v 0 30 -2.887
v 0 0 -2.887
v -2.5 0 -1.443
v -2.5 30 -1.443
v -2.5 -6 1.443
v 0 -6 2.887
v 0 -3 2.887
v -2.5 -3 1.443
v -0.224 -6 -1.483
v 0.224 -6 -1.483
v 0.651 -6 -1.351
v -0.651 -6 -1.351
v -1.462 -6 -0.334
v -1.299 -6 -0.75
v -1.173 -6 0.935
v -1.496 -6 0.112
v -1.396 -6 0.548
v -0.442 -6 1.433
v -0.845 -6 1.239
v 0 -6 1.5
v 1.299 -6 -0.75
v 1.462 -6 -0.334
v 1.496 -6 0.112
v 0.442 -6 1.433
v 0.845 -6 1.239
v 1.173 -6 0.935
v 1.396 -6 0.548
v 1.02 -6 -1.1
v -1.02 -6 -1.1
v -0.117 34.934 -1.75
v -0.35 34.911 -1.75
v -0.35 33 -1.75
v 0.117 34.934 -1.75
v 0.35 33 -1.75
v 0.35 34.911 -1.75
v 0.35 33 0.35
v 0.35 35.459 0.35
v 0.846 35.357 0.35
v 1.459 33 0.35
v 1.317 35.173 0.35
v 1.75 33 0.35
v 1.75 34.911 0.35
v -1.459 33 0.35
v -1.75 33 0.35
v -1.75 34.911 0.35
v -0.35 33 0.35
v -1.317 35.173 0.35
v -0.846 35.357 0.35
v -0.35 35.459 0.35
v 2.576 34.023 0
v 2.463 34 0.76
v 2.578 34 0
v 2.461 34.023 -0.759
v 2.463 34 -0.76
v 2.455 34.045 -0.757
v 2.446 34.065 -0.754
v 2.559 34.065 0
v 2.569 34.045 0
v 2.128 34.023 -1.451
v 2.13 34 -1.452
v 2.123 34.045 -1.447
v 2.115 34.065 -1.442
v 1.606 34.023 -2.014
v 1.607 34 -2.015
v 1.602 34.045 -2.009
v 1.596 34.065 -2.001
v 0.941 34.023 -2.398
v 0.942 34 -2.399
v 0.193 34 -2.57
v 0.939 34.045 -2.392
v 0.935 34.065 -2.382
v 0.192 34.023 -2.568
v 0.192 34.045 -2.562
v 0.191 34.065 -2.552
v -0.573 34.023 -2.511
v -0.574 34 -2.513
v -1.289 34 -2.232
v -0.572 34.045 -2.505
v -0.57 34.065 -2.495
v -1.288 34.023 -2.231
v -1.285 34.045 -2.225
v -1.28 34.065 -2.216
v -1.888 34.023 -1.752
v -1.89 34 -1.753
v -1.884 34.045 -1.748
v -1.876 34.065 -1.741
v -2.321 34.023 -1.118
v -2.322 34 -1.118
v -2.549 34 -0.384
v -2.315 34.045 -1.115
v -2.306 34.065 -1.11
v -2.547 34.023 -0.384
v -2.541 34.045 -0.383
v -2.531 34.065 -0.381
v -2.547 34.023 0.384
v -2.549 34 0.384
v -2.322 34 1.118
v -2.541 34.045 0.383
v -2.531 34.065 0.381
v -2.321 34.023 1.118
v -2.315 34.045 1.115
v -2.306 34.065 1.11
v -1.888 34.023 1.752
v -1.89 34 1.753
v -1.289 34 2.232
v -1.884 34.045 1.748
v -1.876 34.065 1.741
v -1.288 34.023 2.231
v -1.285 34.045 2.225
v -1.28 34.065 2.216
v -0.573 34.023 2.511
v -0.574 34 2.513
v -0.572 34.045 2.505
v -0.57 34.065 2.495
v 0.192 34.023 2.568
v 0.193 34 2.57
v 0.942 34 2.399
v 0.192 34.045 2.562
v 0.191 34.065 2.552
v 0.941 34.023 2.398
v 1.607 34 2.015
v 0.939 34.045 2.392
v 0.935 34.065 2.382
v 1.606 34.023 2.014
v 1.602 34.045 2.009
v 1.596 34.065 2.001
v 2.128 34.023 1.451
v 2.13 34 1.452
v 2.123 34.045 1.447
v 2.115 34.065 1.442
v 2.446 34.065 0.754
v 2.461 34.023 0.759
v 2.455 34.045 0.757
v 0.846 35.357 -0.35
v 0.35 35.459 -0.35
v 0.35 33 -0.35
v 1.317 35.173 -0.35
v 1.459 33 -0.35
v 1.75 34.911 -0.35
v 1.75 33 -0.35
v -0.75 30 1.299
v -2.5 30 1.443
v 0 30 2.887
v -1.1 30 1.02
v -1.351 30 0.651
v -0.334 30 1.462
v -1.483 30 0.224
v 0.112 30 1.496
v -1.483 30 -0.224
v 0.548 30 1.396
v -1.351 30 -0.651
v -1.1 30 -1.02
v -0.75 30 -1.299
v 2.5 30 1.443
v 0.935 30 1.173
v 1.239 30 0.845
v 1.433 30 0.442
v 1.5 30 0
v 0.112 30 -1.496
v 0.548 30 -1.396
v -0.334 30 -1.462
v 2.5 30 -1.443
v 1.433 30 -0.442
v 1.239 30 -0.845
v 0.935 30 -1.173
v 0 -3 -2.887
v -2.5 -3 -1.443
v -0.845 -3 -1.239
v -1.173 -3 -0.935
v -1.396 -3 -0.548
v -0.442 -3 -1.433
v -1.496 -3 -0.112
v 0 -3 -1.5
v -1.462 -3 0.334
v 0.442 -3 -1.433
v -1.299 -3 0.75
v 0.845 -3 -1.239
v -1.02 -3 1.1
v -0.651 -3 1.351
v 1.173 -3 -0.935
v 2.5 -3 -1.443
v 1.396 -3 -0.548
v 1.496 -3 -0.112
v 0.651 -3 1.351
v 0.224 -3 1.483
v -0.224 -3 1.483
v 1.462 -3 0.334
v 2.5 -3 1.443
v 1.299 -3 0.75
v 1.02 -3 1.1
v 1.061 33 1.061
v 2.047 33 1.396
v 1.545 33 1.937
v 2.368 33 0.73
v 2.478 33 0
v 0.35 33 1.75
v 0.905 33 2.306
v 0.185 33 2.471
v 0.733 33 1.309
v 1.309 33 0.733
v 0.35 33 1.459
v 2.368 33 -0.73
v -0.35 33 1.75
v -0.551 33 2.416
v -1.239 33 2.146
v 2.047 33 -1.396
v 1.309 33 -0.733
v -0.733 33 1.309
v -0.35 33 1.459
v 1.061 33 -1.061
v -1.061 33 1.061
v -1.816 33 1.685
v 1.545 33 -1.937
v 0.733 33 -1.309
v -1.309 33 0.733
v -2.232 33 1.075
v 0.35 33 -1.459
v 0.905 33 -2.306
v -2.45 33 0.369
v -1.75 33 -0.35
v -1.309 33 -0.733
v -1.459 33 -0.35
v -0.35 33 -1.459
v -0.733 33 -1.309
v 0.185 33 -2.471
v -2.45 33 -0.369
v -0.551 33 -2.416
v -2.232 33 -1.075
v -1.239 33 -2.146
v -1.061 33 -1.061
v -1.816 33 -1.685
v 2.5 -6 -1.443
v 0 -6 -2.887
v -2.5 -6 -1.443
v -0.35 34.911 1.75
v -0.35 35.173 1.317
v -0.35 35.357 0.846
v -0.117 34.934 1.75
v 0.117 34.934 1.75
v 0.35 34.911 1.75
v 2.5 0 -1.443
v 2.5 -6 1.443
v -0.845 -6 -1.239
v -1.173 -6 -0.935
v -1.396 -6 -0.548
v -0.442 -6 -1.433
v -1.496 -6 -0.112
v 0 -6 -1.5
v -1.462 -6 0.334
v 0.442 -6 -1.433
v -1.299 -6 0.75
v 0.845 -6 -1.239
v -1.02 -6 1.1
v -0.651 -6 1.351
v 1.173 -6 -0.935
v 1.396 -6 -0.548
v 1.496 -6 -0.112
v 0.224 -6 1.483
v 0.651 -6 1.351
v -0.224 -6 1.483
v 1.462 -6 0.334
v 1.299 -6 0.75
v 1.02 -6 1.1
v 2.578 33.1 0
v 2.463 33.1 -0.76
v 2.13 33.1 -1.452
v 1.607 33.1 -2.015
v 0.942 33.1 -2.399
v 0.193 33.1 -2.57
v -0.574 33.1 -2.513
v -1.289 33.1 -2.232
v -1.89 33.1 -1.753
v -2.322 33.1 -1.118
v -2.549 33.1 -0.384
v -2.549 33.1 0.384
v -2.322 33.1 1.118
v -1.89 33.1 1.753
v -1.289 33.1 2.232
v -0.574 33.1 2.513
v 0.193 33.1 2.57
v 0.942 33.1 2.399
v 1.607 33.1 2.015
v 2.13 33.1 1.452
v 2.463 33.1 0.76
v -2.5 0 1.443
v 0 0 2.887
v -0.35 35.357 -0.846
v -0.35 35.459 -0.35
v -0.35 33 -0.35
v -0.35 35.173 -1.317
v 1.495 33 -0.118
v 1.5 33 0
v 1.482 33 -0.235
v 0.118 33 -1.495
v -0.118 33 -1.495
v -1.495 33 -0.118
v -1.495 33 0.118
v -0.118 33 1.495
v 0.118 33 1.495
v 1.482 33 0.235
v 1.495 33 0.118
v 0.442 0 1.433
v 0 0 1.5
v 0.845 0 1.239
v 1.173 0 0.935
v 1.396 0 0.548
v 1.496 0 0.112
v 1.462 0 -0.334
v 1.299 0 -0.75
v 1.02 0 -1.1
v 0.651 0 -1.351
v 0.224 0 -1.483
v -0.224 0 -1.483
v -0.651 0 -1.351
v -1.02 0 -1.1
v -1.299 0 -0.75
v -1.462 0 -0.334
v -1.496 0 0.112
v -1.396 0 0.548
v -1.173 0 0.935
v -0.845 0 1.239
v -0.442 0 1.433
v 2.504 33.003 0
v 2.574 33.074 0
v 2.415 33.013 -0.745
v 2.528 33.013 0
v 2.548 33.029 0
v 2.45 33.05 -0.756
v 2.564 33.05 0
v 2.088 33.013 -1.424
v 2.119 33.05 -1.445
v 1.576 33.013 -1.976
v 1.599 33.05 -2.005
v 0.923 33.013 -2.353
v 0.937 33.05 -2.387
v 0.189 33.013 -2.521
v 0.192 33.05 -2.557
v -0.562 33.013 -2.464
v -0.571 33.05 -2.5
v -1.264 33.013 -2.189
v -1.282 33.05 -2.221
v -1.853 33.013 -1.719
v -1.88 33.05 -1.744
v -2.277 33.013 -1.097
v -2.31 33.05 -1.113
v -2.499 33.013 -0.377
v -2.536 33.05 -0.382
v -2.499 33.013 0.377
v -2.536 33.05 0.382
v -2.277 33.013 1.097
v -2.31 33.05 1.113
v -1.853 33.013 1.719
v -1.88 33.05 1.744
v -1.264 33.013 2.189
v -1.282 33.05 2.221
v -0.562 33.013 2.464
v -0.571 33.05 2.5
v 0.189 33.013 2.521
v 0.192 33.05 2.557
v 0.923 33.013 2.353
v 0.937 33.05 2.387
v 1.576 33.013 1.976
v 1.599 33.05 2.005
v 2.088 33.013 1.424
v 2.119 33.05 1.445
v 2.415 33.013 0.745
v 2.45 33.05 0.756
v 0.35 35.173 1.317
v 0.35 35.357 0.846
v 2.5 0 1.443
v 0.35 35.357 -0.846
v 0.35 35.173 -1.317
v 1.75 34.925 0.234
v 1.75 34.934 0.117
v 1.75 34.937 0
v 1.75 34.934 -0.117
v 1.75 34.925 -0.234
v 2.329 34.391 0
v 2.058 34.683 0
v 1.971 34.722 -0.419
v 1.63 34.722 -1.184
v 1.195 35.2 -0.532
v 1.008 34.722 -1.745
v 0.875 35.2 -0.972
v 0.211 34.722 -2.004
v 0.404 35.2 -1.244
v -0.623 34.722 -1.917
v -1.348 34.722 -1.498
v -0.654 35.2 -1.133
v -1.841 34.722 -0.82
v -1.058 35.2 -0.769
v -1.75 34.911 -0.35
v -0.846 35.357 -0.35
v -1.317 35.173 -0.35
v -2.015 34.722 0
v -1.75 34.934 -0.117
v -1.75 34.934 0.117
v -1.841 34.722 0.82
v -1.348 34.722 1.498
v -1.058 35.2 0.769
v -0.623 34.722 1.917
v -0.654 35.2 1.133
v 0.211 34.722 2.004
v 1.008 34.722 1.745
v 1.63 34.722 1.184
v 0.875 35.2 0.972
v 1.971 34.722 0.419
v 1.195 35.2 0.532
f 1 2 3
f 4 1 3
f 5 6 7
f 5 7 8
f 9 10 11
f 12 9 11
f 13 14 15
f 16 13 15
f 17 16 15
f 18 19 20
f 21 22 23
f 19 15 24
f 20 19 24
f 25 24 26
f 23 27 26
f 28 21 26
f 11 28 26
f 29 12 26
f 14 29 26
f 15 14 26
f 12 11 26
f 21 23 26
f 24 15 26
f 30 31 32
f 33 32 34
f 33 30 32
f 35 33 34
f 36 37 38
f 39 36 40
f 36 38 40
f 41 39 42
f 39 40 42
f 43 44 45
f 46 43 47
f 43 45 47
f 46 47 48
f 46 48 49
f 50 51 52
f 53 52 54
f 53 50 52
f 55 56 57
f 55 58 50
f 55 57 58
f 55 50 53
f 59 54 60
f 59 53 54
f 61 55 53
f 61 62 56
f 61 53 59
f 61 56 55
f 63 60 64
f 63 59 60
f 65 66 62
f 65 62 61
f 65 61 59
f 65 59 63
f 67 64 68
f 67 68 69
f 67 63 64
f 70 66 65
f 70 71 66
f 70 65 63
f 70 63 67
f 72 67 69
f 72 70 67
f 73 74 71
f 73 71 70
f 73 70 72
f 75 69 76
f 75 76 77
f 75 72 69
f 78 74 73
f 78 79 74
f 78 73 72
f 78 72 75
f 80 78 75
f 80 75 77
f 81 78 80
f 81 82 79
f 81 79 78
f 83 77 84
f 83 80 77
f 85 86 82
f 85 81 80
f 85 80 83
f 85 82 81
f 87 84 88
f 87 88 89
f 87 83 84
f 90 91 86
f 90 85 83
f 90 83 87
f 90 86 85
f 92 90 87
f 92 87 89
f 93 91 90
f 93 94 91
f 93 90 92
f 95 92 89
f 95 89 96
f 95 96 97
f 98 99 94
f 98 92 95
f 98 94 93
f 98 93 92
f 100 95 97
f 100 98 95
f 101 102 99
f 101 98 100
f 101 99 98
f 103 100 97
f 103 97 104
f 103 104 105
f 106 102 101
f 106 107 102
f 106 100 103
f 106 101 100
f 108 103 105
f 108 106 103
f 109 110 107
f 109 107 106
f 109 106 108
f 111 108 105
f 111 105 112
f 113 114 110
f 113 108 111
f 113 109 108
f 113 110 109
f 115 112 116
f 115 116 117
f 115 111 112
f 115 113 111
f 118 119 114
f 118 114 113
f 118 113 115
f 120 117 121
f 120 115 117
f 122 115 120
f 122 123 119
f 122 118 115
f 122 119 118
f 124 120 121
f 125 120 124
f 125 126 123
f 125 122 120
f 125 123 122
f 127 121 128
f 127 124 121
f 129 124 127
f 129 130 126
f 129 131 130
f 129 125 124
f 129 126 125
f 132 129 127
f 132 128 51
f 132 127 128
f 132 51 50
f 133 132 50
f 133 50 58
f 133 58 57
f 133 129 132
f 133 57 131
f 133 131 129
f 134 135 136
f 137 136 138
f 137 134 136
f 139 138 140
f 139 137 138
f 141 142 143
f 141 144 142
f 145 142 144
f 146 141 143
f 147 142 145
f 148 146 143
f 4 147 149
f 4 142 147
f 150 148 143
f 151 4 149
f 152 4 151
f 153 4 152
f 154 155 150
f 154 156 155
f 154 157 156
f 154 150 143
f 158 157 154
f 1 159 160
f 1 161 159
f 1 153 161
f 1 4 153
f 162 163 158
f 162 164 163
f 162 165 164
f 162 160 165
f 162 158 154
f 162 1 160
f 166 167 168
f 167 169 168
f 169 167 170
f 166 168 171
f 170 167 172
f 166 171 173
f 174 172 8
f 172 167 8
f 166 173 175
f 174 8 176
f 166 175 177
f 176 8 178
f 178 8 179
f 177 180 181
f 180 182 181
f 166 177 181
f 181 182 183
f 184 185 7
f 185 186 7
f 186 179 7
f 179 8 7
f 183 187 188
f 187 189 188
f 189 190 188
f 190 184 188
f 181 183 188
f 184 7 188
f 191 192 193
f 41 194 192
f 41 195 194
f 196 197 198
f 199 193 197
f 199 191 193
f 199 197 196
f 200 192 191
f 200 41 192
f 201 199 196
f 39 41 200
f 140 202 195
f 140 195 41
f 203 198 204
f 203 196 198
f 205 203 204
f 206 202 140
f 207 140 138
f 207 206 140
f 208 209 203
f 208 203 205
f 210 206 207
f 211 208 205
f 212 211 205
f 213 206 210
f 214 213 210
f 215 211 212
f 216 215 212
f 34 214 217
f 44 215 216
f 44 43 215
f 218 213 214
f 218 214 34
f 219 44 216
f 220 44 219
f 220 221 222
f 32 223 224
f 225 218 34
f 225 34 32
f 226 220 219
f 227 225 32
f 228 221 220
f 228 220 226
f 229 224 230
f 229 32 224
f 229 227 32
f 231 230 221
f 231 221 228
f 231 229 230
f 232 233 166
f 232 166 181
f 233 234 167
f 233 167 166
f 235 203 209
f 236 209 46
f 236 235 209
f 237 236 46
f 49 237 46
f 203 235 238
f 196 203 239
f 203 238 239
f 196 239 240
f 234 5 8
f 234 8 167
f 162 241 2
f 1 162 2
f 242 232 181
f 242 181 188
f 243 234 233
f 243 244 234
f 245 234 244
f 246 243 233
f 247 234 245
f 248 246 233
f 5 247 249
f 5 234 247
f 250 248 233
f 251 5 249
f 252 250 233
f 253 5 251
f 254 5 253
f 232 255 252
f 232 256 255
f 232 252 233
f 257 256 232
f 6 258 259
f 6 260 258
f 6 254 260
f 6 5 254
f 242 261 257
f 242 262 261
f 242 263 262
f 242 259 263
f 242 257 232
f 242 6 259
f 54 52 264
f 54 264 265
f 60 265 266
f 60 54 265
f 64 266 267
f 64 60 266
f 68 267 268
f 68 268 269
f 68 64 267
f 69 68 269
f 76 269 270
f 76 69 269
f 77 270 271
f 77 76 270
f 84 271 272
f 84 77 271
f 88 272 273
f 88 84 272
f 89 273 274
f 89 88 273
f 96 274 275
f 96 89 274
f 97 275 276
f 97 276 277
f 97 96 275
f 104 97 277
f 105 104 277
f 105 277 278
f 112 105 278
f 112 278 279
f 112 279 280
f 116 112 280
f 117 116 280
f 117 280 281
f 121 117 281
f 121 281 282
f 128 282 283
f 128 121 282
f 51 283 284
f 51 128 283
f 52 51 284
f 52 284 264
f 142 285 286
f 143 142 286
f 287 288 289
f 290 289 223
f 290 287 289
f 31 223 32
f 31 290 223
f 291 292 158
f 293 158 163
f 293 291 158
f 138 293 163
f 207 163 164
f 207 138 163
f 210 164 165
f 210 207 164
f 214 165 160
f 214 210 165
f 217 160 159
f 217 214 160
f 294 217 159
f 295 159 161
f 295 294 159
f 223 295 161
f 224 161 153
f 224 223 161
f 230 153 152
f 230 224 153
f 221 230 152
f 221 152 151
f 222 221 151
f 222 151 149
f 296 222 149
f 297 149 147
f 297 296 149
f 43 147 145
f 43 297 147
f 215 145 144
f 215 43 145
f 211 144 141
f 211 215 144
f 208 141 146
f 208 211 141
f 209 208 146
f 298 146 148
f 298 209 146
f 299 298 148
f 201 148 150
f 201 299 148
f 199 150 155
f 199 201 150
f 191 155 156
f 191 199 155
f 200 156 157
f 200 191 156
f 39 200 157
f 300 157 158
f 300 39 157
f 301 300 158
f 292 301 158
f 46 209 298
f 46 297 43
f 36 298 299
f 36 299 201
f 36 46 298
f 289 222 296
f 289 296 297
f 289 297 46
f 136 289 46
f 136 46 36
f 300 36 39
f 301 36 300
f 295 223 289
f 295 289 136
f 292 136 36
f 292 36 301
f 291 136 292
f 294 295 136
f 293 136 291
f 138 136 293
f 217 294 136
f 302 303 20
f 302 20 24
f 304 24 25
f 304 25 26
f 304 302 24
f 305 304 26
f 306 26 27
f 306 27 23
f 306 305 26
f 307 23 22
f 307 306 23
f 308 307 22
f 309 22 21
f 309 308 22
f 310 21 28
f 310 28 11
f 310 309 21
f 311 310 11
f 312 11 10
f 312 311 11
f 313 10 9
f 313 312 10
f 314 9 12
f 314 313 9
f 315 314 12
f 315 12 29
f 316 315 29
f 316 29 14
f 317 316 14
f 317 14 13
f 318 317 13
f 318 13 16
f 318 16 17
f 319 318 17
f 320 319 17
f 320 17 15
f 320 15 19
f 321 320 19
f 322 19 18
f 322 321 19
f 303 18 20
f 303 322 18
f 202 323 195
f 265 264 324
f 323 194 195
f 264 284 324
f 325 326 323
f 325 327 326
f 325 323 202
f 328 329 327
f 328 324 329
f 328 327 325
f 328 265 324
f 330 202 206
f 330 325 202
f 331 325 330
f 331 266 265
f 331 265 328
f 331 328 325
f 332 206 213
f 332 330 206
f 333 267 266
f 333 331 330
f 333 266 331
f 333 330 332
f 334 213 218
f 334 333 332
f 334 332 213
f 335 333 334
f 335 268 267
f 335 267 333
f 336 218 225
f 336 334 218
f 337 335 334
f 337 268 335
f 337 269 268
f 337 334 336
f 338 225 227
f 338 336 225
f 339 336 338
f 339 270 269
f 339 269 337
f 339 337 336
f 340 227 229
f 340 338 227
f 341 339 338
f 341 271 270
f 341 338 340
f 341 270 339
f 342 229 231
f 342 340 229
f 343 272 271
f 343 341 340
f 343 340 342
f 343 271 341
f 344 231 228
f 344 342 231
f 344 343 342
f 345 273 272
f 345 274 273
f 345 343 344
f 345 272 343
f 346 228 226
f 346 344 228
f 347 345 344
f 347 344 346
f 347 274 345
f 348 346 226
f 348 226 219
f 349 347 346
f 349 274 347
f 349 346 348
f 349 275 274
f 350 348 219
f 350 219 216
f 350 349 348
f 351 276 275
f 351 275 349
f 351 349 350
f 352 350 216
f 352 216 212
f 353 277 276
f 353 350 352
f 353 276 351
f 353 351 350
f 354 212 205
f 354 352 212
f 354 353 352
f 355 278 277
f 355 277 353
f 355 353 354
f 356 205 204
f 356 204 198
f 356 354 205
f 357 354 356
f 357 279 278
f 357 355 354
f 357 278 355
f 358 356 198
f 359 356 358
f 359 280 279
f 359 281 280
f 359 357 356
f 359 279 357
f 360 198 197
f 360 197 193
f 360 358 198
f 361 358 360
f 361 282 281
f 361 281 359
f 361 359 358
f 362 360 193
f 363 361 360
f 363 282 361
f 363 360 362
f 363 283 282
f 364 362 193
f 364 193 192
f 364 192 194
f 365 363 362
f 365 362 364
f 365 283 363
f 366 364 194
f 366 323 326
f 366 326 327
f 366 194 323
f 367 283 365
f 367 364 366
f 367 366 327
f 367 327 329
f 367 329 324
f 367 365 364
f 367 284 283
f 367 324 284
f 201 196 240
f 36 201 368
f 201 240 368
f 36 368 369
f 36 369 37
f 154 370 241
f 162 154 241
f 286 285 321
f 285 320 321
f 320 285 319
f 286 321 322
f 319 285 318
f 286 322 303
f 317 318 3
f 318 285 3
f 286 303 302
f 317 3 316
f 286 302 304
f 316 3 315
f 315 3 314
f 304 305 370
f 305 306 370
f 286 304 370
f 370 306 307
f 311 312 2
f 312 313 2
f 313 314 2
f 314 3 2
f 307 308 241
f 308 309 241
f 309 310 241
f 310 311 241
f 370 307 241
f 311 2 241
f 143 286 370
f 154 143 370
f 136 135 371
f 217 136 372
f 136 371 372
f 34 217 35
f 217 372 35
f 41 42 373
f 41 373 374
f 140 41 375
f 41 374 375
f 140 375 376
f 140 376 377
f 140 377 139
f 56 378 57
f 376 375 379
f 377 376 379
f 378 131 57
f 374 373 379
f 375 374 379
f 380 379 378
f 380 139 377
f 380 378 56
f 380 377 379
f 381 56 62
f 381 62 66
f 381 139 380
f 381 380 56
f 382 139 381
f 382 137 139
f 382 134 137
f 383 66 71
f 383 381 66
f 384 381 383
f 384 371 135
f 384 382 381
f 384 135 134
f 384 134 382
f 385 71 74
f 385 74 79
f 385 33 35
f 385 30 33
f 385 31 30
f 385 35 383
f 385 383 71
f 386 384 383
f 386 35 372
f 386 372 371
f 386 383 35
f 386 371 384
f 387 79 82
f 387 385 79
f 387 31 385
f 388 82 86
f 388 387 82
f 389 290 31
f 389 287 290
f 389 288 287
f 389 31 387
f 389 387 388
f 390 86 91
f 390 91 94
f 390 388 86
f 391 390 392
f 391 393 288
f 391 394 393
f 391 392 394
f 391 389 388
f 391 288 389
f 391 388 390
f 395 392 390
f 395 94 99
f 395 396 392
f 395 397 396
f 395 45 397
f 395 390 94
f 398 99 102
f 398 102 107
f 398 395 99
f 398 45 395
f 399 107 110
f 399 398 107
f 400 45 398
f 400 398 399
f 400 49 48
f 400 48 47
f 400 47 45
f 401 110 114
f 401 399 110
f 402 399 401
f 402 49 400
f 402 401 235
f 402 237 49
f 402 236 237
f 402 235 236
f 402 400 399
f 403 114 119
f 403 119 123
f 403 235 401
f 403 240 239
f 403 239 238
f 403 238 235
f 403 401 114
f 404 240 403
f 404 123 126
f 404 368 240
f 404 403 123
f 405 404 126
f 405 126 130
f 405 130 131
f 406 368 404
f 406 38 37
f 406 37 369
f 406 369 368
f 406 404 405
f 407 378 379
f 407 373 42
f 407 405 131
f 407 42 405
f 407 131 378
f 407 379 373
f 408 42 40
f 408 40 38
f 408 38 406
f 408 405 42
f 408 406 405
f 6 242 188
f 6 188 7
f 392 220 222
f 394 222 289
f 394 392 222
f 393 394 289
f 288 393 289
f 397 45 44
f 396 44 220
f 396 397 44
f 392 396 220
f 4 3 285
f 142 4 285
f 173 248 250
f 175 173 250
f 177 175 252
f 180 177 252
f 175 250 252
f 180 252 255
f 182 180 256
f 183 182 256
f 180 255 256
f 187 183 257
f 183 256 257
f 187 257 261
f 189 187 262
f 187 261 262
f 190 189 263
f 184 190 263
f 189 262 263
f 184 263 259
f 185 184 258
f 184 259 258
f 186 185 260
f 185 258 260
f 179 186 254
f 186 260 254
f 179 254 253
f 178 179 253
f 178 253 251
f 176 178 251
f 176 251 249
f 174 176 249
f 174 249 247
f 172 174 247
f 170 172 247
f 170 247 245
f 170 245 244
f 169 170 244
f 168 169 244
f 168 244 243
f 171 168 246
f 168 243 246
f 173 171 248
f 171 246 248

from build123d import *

# Parameters (mm, degrees)
BOSS_EXTRUDE1_DEPTH = 30
SKETCH1_4_R         = 1.5
BOSS_EXTRUDE2_DEPTH = 6
CUT_EXTRUDE1_DEPTH  = 7
FILLET1_R           = 0.1
SKETCH5_R           = 1.5
BOSS_EXTRUDE3_DEPTH = 3


with BuildPart() as part:
    # Sketch1 → Boss-Extrude1 (new body)
    with BuildSketch(Plane(origin=(0, 0, 0), x_dir=(1, 0, 0), z_dir=(0, 1, 0))):
        Polygon((2.5, -1.443375673), (2.5, 1.443375673), (0, 2.886751346), (-2.5, 1.443375673), (-2.5, -1.443375673), (0, -2.886751346), align=None)
    extrude(amount=BOSS_EXTRUDE1_DEPTH)

    # Sketch1<4> → Boss-Extrude2 (add)
    with BuildSketch(Plane(origin=(0, 0, 0), x_dir=(1, 0, 0), z_dir=(0, 1, 0))):
        Circle(SKETCH1_4_R)
    extrude(amount=-BOSS_EXTRUDE2_DEPTH)

    # Sketch3 → Revolve1 (revolve)
    with BuildSketch(Plane.XY):
        with BuildLine():
            Line((0, 30), (1.5, 30))
            Line((1.5, 30), (1.5, 33))
            Line((1.5, 33), (2.577677109, 33))
            Line((2.577677109, 33), (2.577677109, 34))
            ThreePointArc((2.577677109, 34), (2.572999109, 34.033876486), (2.559315248, 34.065217384))
            ThreePointArc((2.559315248, 34.065217384), (1.467028944, 35.116835126), (0, 35.5))
            Line((0, 35.5), (0, 30))
        make_face()
    revolve(axis=Axis((0, 30, 0), (0, -1, 0)))

    # Sketch4 → Cut-Extrude1 (cut)
    with BuildSketch(Plane(origin=(0, 40, 0), x_dir=(1, 0, 0), z_dir=(0, 1, 0))):
        Polygon((-1.75, 0.35), (-1.75, -0.35), (-0.35, -0.35), (-0.35, -1.75), (0.35, -1.75), (0.35, -0.35), (1.75, -0.35), (1.75, 0.35), (0.35, 0.35), (0.35, 1.75), (-0.35, 1.75), (-0.35, 0.35), align=None)
    extrude(amount=-CUT_EXTRUDE1_DEPTH, mode=Mode.SUBTRACT)

    # Fillet1
    fillet1_edges = [part.edges().sort_by_distance(p)[0] for p in [
        (-2.577677109, 33, 0),
    ]]
    fillet(fillet1_edges, radius=FILLET1_R)


with BuildPart() as body_2:
    # Sketch5 → Boss-Extrude3 (new body)
    with BuildSketch(Plane.XZ.offset(6)):
        Polygon((2.5, 1.443375673), (0, 2.886751346), (-2.5, 1.443375673), (-2.5, -1.443375673), (0, -2.886751346), (2.5, -1.443375673), align=None)
        Circle(SKETCH5_R, mode=Mode.SUBTRACT)
    extrude(amount=-BOSS_EXTRUDE3_DEPTH)


solid = Compound([part.part, body_2.part])
